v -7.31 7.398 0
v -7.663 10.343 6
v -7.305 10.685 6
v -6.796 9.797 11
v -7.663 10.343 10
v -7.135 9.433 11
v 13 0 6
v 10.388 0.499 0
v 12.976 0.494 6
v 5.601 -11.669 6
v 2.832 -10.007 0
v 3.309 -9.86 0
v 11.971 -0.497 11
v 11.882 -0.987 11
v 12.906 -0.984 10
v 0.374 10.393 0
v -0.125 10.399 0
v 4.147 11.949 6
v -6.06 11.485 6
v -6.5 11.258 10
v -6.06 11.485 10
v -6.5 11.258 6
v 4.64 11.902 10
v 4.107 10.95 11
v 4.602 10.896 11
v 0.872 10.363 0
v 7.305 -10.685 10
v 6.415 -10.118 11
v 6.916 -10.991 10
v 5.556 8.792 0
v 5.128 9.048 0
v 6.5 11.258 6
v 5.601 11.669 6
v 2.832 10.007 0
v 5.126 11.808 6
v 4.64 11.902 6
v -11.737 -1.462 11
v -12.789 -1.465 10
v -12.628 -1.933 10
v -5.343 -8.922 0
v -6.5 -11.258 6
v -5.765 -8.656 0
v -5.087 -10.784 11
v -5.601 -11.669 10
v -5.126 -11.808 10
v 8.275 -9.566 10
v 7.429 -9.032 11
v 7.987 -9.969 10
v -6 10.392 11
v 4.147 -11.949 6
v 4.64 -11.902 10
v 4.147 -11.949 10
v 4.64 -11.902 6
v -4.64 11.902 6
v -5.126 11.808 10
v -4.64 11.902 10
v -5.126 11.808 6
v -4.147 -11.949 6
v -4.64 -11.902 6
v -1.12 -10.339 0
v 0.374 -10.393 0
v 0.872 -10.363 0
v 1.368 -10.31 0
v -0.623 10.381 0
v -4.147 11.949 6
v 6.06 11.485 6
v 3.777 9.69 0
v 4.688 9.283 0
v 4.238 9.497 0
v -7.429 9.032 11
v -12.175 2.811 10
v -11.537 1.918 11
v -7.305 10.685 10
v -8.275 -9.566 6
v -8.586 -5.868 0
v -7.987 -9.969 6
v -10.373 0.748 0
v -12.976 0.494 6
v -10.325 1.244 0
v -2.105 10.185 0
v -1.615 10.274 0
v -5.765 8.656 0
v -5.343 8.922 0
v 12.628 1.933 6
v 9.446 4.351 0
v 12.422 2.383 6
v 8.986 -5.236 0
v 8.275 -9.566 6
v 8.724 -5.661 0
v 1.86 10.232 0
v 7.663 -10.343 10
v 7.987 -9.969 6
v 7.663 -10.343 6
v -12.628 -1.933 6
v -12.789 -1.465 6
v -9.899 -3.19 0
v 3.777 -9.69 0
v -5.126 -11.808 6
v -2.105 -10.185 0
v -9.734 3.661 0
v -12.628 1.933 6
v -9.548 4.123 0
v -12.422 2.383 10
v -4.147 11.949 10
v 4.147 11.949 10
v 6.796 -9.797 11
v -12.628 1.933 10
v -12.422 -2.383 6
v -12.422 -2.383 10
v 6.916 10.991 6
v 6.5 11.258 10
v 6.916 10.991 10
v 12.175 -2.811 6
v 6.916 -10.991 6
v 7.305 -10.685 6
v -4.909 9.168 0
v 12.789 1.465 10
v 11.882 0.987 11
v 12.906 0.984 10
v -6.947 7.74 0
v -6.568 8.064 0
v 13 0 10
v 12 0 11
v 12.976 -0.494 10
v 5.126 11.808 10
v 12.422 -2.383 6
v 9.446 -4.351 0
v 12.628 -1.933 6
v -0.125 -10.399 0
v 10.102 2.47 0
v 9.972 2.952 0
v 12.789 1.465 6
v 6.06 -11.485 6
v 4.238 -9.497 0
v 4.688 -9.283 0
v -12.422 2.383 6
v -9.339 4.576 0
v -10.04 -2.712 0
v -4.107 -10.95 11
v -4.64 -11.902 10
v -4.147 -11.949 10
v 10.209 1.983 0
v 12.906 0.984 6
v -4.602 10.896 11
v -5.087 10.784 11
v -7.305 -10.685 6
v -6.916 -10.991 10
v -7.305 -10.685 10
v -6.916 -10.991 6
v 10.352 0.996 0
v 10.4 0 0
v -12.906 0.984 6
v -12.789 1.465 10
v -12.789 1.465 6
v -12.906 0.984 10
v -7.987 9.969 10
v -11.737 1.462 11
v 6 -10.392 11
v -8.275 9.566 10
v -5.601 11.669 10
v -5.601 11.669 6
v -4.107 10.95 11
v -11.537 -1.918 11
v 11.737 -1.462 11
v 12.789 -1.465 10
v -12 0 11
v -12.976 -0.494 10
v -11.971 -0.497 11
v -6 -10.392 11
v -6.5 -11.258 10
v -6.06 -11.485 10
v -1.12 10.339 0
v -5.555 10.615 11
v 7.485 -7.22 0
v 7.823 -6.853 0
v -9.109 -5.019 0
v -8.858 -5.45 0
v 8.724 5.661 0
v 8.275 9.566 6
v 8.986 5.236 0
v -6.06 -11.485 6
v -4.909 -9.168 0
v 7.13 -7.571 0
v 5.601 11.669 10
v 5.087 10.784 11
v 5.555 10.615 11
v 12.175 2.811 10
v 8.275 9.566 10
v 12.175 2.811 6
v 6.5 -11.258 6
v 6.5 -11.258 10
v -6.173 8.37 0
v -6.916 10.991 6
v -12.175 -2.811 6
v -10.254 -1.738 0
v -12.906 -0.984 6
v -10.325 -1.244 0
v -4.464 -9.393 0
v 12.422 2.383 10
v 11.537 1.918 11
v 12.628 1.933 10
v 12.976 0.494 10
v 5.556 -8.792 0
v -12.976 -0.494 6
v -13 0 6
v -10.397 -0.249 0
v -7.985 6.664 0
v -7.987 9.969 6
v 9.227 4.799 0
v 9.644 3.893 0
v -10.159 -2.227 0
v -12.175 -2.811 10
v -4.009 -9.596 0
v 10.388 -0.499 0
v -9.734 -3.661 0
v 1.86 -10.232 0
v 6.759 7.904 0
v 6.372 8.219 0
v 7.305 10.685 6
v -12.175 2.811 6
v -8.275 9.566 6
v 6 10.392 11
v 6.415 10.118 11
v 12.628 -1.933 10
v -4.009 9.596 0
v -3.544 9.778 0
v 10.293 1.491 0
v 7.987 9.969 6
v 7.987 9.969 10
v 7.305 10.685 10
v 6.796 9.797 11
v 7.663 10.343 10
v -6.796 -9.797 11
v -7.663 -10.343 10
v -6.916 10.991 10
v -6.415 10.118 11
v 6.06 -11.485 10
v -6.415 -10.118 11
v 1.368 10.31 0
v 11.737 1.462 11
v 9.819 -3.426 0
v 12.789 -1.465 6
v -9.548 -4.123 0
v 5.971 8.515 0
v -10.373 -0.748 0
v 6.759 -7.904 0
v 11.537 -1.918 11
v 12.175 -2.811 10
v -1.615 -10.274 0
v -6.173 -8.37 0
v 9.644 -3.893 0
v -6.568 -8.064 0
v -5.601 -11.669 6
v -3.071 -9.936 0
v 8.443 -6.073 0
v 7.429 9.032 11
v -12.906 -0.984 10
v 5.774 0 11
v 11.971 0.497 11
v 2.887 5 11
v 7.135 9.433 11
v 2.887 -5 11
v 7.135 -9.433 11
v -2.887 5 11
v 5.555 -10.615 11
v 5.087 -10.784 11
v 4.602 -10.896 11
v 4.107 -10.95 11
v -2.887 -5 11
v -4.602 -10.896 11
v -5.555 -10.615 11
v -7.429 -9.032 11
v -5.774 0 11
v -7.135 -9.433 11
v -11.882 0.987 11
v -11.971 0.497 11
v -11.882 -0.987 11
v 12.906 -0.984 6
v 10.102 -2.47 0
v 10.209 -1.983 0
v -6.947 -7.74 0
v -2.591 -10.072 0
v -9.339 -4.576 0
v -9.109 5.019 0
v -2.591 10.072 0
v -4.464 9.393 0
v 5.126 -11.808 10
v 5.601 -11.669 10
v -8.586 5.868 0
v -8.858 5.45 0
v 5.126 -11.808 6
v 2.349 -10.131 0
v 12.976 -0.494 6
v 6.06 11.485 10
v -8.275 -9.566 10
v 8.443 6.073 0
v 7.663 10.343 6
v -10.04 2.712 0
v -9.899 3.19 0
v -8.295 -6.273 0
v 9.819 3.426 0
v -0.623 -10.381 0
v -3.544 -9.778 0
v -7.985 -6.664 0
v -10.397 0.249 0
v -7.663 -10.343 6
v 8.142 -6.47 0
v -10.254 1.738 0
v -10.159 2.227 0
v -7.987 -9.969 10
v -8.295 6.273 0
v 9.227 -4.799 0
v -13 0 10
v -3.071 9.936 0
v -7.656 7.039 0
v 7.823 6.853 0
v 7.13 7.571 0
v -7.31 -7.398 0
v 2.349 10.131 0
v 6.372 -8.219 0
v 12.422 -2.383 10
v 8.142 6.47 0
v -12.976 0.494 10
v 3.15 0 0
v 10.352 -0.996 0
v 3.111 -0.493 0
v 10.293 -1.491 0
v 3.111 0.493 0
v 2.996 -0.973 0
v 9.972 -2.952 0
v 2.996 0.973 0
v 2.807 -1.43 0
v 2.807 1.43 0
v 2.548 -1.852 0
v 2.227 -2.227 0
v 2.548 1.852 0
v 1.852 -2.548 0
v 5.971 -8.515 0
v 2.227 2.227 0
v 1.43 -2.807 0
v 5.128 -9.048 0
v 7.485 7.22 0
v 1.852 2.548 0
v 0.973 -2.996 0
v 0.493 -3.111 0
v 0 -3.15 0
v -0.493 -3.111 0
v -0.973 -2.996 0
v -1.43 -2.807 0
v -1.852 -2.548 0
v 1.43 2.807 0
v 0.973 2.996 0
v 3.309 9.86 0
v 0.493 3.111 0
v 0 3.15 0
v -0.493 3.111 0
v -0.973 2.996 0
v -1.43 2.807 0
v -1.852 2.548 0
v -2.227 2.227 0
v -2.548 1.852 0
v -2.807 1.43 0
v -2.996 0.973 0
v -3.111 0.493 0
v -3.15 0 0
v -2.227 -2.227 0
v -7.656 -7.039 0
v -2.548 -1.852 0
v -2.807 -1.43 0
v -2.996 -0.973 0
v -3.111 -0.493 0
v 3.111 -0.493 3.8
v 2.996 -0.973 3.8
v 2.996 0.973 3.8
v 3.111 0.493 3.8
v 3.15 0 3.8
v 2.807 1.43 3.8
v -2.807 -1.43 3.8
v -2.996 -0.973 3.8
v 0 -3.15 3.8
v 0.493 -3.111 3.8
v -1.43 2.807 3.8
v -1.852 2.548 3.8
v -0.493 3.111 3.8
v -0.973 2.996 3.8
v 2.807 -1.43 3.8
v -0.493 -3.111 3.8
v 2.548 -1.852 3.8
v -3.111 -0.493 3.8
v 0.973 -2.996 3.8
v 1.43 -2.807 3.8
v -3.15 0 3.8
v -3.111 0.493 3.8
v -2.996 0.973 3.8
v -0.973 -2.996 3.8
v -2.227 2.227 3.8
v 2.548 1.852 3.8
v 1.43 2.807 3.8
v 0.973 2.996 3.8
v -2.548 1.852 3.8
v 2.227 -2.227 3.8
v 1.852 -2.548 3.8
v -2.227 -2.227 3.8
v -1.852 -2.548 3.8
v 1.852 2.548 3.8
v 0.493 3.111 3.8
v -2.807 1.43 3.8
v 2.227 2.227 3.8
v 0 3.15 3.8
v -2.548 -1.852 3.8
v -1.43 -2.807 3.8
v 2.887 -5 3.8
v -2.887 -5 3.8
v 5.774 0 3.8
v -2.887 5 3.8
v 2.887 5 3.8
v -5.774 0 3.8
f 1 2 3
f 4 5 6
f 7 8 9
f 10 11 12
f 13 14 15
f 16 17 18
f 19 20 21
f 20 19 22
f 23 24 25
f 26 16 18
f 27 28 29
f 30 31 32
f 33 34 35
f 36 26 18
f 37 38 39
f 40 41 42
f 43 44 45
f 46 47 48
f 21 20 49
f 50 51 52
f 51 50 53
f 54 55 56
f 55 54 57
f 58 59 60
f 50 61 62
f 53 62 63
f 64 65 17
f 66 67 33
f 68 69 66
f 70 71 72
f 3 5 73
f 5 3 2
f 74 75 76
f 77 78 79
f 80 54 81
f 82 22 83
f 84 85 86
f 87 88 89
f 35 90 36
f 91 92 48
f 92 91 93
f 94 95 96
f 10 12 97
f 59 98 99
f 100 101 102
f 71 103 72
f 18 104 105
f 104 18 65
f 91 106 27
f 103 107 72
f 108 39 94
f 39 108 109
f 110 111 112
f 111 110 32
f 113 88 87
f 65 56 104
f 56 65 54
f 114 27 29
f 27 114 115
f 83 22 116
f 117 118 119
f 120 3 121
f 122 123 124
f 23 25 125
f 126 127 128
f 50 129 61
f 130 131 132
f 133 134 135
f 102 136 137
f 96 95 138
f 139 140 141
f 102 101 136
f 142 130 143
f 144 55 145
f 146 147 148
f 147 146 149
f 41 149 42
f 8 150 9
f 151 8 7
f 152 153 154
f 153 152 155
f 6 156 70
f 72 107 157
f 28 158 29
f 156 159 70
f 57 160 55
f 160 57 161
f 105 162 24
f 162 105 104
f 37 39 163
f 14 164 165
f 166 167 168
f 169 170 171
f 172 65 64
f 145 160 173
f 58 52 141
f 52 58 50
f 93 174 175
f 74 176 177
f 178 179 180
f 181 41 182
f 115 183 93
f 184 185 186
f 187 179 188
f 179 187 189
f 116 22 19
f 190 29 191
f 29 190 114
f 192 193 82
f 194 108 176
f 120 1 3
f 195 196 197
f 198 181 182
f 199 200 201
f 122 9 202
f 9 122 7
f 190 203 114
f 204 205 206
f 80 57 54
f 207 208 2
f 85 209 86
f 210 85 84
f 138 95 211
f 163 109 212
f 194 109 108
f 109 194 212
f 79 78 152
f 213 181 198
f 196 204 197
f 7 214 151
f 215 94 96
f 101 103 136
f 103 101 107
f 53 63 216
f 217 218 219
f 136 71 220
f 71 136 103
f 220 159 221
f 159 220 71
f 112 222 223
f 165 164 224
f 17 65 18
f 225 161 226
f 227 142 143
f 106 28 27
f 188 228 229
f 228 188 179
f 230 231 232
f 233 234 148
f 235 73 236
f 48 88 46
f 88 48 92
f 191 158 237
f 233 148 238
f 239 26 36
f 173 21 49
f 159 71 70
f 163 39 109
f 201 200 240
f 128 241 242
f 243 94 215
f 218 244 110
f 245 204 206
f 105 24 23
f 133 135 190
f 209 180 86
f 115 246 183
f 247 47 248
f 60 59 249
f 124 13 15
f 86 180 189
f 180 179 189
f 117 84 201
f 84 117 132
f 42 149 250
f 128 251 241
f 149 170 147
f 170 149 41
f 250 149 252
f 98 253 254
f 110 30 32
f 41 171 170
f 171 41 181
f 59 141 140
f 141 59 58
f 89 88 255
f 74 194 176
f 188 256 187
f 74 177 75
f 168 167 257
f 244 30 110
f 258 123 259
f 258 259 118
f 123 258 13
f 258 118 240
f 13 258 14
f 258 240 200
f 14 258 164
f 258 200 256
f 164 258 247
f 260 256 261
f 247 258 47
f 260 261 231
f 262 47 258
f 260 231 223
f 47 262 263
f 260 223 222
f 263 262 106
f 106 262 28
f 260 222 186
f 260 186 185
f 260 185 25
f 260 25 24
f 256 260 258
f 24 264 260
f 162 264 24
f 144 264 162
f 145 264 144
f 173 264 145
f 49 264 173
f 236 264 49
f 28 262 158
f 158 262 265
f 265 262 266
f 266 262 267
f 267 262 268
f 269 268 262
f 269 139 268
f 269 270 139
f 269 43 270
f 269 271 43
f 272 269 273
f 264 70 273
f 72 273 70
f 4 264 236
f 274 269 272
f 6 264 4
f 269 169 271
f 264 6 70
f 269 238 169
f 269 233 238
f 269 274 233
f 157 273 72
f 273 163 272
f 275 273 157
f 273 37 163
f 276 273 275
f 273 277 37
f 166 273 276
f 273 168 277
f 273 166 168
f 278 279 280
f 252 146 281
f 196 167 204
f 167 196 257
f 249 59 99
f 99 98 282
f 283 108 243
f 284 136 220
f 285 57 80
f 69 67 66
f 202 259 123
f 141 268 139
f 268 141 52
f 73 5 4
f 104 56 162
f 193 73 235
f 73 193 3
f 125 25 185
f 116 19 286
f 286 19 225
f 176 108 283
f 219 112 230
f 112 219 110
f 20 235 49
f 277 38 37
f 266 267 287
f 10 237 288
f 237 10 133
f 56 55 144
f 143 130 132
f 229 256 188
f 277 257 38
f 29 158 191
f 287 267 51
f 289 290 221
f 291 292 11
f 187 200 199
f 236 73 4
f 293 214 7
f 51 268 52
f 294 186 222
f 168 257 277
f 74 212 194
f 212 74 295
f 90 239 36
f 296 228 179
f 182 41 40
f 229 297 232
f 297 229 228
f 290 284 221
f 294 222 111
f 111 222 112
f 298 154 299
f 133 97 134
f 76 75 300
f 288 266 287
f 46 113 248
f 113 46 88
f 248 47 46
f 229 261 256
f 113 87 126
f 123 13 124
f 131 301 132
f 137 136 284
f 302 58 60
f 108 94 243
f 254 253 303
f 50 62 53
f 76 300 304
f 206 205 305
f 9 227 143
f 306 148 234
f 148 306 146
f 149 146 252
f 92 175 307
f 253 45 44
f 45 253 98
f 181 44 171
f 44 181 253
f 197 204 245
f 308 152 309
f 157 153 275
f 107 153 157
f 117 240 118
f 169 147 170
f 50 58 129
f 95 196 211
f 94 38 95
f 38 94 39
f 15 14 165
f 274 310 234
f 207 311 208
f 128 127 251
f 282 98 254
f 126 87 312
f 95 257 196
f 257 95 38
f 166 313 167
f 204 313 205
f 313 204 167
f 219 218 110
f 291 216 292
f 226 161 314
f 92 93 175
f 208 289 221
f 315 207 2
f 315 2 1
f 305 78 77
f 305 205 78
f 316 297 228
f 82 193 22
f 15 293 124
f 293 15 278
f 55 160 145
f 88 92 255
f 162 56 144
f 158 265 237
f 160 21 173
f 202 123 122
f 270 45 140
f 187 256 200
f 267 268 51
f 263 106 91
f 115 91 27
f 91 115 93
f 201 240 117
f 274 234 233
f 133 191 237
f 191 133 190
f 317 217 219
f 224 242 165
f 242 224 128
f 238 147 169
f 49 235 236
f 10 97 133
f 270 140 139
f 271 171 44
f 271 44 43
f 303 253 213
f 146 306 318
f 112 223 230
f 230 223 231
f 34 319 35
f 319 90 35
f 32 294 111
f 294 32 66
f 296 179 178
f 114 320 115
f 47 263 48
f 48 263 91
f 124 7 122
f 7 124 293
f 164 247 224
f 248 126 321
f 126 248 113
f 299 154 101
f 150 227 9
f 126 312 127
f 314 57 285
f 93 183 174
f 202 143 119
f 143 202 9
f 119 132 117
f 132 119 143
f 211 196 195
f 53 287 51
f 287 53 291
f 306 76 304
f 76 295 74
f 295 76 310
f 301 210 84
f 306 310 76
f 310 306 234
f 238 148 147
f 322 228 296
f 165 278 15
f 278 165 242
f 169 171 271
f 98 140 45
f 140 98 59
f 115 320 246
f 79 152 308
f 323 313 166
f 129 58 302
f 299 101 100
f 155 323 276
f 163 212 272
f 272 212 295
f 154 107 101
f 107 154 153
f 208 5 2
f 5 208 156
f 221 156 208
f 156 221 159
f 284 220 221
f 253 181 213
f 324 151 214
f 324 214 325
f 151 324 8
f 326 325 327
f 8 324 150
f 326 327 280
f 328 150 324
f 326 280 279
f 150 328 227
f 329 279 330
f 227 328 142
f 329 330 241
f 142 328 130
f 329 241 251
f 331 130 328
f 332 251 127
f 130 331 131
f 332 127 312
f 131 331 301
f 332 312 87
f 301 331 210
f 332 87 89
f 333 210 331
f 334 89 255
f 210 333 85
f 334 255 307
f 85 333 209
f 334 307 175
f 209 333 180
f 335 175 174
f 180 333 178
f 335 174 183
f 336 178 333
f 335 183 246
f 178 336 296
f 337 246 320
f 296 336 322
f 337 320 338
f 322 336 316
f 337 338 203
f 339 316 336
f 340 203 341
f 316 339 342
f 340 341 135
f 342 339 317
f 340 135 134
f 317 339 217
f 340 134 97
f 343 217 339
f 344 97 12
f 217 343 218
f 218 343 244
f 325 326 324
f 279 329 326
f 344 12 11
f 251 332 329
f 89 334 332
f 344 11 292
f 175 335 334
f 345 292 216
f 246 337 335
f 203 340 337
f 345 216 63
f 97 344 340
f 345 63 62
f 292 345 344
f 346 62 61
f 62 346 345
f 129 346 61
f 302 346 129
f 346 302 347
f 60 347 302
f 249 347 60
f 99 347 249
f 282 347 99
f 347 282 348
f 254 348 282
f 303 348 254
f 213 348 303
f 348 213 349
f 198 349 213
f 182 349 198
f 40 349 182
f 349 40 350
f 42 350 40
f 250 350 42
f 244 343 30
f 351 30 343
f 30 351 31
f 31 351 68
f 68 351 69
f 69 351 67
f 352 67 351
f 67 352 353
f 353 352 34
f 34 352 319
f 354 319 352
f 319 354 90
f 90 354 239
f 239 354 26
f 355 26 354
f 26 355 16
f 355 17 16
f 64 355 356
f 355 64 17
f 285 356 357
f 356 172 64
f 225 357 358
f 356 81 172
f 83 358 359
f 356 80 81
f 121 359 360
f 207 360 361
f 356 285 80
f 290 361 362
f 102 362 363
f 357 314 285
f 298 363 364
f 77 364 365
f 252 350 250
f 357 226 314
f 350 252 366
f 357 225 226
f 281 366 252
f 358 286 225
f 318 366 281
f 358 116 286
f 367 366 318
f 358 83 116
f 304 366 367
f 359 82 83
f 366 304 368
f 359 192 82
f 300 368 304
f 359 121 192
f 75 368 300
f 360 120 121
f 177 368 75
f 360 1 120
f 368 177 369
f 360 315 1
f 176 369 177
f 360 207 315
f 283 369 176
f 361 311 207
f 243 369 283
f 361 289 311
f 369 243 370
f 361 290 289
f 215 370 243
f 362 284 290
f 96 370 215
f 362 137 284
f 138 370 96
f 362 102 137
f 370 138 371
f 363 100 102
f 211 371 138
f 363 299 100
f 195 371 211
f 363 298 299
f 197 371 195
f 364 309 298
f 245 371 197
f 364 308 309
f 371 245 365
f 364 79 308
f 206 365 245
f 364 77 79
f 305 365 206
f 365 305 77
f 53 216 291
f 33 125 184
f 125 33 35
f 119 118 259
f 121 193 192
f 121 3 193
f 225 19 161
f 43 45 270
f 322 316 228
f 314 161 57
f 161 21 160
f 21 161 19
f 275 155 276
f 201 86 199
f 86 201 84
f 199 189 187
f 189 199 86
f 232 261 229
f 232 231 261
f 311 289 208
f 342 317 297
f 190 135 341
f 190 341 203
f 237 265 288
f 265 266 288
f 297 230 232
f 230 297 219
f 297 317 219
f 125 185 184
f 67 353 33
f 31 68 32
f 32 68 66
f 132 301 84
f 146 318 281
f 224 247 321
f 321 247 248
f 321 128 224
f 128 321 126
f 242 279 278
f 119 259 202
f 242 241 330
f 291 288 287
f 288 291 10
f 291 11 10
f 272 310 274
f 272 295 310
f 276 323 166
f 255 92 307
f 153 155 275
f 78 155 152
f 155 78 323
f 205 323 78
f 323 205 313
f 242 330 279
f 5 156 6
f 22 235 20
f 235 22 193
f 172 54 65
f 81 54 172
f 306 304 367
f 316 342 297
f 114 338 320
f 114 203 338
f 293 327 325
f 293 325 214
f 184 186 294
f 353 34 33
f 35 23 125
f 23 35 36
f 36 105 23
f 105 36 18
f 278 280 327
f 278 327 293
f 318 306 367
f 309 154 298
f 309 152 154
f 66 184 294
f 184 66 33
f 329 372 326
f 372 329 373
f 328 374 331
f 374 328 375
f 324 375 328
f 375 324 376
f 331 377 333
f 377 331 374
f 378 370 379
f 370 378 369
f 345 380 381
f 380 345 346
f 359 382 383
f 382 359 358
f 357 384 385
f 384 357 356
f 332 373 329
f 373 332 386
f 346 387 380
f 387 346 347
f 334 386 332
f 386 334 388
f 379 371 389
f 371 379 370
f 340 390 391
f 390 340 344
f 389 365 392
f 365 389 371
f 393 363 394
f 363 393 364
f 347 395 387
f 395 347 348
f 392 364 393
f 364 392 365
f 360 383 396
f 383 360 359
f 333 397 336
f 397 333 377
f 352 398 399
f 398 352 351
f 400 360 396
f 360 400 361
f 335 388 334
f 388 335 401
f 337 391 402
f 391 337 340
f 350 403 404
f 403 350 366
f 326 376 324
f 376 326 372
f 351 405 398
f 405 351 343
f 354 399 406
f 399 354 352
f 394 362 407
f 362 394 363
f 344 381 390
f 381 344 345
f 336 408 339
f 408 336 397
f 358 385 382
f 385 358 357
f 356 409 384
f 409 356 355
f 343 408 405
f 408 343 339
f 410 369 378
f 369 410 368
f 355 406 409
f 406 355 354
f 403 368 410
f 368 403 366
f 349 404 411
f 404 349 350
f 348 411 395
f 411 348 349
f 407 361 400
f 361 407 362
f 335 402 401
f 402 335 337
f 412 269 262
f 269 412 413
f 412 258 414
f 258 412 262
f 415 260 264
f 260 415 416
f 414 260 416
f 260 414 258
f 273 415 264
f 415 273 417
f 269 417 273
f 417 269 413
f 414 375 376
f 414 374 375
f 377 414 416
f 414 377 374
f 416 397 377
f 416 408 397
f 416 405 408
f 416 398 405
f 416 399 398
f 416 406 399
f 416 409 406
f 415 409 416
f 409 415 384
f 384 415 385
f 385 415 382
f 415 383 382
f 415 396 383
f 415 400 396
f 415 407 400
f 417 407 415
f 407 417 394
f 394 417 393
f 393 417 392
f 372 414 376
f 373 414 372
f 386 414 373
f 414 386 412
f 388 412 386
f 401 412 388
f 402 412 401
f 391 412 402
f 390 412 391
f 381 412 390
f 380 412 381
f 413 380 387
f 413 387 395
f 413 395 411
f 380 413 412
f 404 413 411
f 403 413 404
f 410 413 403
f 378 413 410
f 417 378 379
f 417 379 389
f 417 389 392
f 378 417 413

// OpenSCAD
include <FullAssembly.scad>
/* [Hidden] */
isStandalone=false;

BaseKnob(pri_poledia, basebolt);
